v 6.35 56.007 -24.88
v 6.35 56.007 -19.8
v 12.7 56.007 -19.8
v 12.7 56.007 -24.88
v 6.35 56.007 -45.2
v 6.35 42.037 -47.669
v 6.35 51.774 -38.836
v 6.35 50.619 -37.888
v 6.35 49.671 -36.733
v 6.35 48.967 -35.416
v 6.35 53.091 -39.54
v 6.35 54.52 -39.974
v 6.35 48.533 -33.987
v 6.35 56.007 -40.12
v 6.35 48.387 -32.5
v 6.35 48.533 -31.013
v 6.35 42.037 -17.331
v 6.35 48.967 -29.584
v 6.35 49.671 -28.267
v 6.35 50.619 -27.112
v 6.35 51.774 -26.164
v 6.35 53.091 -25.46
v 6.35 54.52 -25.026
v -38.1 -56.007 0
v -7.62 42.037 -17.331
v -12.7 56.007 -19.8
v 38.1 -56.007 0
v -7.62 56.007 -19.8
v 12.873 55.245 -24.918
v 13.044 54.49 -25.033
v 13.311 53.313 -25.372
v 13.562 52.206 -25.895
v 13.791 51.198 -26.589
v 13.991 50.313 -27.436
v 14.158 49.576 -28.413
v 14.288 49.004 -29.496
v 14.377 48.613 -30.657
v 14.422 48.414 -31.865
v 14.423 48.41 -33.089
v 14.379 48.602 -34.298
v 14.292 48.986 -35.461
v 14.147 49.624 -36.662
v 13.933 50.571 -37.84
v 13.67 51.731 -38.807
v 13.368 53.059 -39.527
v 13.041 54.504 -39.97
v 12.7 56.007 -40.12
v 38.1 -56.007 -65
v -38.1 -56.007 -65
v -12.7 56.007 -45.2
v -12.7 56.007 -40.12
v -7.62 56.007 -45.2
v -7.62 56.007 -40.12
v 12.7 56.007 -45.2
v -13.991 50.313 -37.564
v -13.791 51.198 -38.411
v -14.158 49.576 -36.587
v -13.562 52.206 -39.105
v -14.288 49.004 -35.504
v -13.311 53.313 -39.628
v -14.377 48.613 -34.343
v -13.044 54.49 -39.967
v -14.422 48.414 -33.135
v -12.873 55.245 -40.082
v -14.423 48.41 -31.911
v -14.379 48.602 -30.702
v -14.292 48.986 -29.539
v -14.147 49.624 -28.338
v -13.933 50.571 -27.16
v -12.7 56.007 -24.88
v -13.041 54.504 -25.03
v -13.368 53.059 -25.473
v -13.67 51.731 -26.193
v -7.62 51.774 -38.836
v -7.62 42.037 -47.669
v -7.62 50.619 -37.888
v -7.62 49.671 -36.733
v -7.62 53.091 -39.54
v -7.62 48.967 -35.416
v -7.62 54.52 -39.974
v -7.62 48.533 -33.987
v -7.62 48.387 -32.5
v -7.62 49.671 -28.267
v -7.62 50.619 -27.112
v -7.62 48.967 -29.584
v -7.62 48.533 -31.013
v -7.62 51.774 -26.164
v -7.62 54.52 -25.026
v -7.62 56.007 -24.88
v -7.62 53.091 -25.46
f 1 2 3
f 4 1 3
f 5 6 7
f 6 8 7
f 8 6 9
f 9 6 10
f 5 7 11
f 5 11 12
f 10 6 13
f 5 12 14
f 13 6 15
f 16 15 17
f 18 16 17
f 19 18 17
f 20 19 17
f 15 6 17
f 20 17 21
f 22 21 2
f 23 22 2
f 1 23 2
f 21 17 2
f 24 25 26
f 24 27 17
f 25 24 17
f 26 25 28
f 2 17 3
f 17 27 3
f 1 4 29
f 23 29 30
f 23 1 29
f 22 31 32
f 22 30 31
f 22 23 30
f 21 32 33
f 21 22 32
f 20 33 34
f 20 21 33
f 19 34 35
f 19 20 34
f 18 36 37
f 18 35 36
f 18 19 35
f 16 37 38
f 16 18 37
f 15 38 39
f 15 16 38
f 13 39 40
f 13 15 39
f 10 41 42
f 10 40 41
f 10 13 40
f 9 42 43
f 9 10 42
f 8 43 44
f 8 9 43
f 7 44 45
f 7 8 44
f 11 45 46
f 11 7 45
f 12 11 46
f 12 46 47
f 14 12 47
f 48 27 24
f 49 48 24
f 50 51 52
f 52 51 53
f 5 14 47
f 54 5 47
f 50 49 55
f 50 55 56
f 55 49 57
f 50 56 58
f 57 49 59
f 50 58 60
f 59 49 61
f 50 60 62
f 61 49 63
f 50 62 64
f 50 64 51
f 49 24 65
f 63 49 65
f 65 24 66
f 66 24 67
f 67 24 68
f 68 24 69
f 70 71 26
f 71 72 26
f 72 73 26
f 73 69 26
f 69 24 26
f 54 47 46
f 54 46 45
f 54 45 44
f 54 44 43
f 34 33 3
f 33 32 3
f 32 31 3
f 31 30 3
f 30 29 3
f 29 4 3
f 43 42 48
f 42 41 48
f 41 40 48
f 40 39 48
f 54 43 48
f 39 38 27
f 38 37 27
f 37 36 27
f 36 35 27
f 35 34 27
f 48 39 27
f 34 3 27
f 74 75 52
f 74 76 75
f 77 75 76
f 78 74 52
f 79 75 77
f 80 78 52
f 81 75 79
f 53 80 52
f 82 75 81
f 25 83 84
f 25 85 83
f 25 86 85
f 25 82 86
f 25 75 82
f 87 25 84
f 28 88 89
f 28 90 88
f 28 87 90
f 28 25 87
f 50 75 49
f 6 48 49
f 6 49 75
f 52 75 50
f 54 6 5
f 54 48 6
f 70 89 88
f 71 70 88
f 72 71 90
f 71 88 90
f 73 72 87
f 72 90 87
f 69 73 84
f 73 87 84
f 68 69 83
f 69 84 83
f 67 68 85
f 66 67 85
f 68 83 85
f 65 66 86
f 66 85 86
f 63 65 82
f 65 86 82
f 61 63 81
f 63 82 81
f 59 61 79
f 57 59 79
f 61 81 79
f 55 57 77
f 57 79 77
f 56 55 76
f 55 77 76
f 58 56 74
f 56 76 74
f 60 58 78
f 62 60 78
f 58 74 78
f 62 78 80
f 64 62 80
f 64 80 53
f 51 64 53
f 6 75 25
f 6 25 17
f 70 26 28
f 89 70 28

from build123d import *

# Parameters (mm, degrees)
BOSS_EXTRUDE1_DEPTH     = 65.000000048
CUT_EXTRUDE1_DEPTH      = 39.1
CUT_EXTRUDE1_DEPTH_BACK = 39.1
SKETCH4_W               = 13.97
SKETCH4_H               = 13.97
CUT_EXTRUDE2_DEPTH      = 1
CUT_EXTRUDE2_DEPTH_BACK = 66.000000048
CUT_EXTRUDE4_DEPTH      = 39.1
CUT_EXTRUDE4_DEPTH_BACK = 39.1


with BuildPart() as part:
    # Sketch2 → Boss-Extrude1 (new body)
    with BuildSketch(Plane.XY):
        Polygon((-38.1, -56.007), (-12.7, 56.007), (12.7, 56.007), (38.1, -56.007), align=None)
    extrude(amount=-BOSS_EXTRUDE1_DEPTH)

    # Sketch3 → Cut-Extrude1 (cut, two sides)
    with BuildSketch(Plane(origin=(0, 0, 0), x_dir=(0, 0, -1), z_dir=(1, 0, 0))) as cut_extrude1_sk:
        Polygon((0, -56.007), (19.800000024, 56.007), (0, 56.007), align=None)
        Polygon((65.000000048, -56.007), (45.200000024, 56.007), (65.000000048, 56.007), align=None)
    extrude(amount=CUT_EXTRUDE1_DEPTH, mode=Mode.SUBTRACT)
    extrude(cut_extrude1_sk.sketch, amount=-CUT_EXTRUDE1_DEPTH_BACK, mode=Mode.SUBTRACT)

    # Sketch4 → Cut-Extrude2 (cut, two sides)
    with BuildSketch(Plane.XY) as cut_extrude2_sk:
        with Locations((-0.635, 49.022)):
            Rectangle(SKETCH4_W, SKETCH4_H)
    extrude(amount=CUT_EXTRUDE2_DEPTH, mode=Mode.SUBTRACT)
    extrude(cut_extrude2_sk.sketch, amount=-CUT_EXTRUDE2_DEPTH_BACK, mode=Mode.SUBTRACT)

    # Sketch5 → Cut-Extrude4 (cut, two sides)
    with BuildSketch(Plane(origin=(0, 0, 0), x_dir=(0, 0, -1), z_dir=(1, 0, 0))) as cut_extrude4_sk:
        with BuildLine():
            Line((40.120000024, 56.007), (24.880000024, 56.007))
            ThreePointArc((24.880000024, 56.007), (32.500000024, 48.387), (40.120000024, 56.007))
        make_face()
    extrude(amount=CUT_EXTRUDE4_DEPTH, mode=Mode.SUBTRACT)
    extrude(cut_extrude4_sk.sketch, amount=-CUT_EXTRUDE4_DEPTH_BACK, mode=Mode.SUBTRACT)


solid = part.part
